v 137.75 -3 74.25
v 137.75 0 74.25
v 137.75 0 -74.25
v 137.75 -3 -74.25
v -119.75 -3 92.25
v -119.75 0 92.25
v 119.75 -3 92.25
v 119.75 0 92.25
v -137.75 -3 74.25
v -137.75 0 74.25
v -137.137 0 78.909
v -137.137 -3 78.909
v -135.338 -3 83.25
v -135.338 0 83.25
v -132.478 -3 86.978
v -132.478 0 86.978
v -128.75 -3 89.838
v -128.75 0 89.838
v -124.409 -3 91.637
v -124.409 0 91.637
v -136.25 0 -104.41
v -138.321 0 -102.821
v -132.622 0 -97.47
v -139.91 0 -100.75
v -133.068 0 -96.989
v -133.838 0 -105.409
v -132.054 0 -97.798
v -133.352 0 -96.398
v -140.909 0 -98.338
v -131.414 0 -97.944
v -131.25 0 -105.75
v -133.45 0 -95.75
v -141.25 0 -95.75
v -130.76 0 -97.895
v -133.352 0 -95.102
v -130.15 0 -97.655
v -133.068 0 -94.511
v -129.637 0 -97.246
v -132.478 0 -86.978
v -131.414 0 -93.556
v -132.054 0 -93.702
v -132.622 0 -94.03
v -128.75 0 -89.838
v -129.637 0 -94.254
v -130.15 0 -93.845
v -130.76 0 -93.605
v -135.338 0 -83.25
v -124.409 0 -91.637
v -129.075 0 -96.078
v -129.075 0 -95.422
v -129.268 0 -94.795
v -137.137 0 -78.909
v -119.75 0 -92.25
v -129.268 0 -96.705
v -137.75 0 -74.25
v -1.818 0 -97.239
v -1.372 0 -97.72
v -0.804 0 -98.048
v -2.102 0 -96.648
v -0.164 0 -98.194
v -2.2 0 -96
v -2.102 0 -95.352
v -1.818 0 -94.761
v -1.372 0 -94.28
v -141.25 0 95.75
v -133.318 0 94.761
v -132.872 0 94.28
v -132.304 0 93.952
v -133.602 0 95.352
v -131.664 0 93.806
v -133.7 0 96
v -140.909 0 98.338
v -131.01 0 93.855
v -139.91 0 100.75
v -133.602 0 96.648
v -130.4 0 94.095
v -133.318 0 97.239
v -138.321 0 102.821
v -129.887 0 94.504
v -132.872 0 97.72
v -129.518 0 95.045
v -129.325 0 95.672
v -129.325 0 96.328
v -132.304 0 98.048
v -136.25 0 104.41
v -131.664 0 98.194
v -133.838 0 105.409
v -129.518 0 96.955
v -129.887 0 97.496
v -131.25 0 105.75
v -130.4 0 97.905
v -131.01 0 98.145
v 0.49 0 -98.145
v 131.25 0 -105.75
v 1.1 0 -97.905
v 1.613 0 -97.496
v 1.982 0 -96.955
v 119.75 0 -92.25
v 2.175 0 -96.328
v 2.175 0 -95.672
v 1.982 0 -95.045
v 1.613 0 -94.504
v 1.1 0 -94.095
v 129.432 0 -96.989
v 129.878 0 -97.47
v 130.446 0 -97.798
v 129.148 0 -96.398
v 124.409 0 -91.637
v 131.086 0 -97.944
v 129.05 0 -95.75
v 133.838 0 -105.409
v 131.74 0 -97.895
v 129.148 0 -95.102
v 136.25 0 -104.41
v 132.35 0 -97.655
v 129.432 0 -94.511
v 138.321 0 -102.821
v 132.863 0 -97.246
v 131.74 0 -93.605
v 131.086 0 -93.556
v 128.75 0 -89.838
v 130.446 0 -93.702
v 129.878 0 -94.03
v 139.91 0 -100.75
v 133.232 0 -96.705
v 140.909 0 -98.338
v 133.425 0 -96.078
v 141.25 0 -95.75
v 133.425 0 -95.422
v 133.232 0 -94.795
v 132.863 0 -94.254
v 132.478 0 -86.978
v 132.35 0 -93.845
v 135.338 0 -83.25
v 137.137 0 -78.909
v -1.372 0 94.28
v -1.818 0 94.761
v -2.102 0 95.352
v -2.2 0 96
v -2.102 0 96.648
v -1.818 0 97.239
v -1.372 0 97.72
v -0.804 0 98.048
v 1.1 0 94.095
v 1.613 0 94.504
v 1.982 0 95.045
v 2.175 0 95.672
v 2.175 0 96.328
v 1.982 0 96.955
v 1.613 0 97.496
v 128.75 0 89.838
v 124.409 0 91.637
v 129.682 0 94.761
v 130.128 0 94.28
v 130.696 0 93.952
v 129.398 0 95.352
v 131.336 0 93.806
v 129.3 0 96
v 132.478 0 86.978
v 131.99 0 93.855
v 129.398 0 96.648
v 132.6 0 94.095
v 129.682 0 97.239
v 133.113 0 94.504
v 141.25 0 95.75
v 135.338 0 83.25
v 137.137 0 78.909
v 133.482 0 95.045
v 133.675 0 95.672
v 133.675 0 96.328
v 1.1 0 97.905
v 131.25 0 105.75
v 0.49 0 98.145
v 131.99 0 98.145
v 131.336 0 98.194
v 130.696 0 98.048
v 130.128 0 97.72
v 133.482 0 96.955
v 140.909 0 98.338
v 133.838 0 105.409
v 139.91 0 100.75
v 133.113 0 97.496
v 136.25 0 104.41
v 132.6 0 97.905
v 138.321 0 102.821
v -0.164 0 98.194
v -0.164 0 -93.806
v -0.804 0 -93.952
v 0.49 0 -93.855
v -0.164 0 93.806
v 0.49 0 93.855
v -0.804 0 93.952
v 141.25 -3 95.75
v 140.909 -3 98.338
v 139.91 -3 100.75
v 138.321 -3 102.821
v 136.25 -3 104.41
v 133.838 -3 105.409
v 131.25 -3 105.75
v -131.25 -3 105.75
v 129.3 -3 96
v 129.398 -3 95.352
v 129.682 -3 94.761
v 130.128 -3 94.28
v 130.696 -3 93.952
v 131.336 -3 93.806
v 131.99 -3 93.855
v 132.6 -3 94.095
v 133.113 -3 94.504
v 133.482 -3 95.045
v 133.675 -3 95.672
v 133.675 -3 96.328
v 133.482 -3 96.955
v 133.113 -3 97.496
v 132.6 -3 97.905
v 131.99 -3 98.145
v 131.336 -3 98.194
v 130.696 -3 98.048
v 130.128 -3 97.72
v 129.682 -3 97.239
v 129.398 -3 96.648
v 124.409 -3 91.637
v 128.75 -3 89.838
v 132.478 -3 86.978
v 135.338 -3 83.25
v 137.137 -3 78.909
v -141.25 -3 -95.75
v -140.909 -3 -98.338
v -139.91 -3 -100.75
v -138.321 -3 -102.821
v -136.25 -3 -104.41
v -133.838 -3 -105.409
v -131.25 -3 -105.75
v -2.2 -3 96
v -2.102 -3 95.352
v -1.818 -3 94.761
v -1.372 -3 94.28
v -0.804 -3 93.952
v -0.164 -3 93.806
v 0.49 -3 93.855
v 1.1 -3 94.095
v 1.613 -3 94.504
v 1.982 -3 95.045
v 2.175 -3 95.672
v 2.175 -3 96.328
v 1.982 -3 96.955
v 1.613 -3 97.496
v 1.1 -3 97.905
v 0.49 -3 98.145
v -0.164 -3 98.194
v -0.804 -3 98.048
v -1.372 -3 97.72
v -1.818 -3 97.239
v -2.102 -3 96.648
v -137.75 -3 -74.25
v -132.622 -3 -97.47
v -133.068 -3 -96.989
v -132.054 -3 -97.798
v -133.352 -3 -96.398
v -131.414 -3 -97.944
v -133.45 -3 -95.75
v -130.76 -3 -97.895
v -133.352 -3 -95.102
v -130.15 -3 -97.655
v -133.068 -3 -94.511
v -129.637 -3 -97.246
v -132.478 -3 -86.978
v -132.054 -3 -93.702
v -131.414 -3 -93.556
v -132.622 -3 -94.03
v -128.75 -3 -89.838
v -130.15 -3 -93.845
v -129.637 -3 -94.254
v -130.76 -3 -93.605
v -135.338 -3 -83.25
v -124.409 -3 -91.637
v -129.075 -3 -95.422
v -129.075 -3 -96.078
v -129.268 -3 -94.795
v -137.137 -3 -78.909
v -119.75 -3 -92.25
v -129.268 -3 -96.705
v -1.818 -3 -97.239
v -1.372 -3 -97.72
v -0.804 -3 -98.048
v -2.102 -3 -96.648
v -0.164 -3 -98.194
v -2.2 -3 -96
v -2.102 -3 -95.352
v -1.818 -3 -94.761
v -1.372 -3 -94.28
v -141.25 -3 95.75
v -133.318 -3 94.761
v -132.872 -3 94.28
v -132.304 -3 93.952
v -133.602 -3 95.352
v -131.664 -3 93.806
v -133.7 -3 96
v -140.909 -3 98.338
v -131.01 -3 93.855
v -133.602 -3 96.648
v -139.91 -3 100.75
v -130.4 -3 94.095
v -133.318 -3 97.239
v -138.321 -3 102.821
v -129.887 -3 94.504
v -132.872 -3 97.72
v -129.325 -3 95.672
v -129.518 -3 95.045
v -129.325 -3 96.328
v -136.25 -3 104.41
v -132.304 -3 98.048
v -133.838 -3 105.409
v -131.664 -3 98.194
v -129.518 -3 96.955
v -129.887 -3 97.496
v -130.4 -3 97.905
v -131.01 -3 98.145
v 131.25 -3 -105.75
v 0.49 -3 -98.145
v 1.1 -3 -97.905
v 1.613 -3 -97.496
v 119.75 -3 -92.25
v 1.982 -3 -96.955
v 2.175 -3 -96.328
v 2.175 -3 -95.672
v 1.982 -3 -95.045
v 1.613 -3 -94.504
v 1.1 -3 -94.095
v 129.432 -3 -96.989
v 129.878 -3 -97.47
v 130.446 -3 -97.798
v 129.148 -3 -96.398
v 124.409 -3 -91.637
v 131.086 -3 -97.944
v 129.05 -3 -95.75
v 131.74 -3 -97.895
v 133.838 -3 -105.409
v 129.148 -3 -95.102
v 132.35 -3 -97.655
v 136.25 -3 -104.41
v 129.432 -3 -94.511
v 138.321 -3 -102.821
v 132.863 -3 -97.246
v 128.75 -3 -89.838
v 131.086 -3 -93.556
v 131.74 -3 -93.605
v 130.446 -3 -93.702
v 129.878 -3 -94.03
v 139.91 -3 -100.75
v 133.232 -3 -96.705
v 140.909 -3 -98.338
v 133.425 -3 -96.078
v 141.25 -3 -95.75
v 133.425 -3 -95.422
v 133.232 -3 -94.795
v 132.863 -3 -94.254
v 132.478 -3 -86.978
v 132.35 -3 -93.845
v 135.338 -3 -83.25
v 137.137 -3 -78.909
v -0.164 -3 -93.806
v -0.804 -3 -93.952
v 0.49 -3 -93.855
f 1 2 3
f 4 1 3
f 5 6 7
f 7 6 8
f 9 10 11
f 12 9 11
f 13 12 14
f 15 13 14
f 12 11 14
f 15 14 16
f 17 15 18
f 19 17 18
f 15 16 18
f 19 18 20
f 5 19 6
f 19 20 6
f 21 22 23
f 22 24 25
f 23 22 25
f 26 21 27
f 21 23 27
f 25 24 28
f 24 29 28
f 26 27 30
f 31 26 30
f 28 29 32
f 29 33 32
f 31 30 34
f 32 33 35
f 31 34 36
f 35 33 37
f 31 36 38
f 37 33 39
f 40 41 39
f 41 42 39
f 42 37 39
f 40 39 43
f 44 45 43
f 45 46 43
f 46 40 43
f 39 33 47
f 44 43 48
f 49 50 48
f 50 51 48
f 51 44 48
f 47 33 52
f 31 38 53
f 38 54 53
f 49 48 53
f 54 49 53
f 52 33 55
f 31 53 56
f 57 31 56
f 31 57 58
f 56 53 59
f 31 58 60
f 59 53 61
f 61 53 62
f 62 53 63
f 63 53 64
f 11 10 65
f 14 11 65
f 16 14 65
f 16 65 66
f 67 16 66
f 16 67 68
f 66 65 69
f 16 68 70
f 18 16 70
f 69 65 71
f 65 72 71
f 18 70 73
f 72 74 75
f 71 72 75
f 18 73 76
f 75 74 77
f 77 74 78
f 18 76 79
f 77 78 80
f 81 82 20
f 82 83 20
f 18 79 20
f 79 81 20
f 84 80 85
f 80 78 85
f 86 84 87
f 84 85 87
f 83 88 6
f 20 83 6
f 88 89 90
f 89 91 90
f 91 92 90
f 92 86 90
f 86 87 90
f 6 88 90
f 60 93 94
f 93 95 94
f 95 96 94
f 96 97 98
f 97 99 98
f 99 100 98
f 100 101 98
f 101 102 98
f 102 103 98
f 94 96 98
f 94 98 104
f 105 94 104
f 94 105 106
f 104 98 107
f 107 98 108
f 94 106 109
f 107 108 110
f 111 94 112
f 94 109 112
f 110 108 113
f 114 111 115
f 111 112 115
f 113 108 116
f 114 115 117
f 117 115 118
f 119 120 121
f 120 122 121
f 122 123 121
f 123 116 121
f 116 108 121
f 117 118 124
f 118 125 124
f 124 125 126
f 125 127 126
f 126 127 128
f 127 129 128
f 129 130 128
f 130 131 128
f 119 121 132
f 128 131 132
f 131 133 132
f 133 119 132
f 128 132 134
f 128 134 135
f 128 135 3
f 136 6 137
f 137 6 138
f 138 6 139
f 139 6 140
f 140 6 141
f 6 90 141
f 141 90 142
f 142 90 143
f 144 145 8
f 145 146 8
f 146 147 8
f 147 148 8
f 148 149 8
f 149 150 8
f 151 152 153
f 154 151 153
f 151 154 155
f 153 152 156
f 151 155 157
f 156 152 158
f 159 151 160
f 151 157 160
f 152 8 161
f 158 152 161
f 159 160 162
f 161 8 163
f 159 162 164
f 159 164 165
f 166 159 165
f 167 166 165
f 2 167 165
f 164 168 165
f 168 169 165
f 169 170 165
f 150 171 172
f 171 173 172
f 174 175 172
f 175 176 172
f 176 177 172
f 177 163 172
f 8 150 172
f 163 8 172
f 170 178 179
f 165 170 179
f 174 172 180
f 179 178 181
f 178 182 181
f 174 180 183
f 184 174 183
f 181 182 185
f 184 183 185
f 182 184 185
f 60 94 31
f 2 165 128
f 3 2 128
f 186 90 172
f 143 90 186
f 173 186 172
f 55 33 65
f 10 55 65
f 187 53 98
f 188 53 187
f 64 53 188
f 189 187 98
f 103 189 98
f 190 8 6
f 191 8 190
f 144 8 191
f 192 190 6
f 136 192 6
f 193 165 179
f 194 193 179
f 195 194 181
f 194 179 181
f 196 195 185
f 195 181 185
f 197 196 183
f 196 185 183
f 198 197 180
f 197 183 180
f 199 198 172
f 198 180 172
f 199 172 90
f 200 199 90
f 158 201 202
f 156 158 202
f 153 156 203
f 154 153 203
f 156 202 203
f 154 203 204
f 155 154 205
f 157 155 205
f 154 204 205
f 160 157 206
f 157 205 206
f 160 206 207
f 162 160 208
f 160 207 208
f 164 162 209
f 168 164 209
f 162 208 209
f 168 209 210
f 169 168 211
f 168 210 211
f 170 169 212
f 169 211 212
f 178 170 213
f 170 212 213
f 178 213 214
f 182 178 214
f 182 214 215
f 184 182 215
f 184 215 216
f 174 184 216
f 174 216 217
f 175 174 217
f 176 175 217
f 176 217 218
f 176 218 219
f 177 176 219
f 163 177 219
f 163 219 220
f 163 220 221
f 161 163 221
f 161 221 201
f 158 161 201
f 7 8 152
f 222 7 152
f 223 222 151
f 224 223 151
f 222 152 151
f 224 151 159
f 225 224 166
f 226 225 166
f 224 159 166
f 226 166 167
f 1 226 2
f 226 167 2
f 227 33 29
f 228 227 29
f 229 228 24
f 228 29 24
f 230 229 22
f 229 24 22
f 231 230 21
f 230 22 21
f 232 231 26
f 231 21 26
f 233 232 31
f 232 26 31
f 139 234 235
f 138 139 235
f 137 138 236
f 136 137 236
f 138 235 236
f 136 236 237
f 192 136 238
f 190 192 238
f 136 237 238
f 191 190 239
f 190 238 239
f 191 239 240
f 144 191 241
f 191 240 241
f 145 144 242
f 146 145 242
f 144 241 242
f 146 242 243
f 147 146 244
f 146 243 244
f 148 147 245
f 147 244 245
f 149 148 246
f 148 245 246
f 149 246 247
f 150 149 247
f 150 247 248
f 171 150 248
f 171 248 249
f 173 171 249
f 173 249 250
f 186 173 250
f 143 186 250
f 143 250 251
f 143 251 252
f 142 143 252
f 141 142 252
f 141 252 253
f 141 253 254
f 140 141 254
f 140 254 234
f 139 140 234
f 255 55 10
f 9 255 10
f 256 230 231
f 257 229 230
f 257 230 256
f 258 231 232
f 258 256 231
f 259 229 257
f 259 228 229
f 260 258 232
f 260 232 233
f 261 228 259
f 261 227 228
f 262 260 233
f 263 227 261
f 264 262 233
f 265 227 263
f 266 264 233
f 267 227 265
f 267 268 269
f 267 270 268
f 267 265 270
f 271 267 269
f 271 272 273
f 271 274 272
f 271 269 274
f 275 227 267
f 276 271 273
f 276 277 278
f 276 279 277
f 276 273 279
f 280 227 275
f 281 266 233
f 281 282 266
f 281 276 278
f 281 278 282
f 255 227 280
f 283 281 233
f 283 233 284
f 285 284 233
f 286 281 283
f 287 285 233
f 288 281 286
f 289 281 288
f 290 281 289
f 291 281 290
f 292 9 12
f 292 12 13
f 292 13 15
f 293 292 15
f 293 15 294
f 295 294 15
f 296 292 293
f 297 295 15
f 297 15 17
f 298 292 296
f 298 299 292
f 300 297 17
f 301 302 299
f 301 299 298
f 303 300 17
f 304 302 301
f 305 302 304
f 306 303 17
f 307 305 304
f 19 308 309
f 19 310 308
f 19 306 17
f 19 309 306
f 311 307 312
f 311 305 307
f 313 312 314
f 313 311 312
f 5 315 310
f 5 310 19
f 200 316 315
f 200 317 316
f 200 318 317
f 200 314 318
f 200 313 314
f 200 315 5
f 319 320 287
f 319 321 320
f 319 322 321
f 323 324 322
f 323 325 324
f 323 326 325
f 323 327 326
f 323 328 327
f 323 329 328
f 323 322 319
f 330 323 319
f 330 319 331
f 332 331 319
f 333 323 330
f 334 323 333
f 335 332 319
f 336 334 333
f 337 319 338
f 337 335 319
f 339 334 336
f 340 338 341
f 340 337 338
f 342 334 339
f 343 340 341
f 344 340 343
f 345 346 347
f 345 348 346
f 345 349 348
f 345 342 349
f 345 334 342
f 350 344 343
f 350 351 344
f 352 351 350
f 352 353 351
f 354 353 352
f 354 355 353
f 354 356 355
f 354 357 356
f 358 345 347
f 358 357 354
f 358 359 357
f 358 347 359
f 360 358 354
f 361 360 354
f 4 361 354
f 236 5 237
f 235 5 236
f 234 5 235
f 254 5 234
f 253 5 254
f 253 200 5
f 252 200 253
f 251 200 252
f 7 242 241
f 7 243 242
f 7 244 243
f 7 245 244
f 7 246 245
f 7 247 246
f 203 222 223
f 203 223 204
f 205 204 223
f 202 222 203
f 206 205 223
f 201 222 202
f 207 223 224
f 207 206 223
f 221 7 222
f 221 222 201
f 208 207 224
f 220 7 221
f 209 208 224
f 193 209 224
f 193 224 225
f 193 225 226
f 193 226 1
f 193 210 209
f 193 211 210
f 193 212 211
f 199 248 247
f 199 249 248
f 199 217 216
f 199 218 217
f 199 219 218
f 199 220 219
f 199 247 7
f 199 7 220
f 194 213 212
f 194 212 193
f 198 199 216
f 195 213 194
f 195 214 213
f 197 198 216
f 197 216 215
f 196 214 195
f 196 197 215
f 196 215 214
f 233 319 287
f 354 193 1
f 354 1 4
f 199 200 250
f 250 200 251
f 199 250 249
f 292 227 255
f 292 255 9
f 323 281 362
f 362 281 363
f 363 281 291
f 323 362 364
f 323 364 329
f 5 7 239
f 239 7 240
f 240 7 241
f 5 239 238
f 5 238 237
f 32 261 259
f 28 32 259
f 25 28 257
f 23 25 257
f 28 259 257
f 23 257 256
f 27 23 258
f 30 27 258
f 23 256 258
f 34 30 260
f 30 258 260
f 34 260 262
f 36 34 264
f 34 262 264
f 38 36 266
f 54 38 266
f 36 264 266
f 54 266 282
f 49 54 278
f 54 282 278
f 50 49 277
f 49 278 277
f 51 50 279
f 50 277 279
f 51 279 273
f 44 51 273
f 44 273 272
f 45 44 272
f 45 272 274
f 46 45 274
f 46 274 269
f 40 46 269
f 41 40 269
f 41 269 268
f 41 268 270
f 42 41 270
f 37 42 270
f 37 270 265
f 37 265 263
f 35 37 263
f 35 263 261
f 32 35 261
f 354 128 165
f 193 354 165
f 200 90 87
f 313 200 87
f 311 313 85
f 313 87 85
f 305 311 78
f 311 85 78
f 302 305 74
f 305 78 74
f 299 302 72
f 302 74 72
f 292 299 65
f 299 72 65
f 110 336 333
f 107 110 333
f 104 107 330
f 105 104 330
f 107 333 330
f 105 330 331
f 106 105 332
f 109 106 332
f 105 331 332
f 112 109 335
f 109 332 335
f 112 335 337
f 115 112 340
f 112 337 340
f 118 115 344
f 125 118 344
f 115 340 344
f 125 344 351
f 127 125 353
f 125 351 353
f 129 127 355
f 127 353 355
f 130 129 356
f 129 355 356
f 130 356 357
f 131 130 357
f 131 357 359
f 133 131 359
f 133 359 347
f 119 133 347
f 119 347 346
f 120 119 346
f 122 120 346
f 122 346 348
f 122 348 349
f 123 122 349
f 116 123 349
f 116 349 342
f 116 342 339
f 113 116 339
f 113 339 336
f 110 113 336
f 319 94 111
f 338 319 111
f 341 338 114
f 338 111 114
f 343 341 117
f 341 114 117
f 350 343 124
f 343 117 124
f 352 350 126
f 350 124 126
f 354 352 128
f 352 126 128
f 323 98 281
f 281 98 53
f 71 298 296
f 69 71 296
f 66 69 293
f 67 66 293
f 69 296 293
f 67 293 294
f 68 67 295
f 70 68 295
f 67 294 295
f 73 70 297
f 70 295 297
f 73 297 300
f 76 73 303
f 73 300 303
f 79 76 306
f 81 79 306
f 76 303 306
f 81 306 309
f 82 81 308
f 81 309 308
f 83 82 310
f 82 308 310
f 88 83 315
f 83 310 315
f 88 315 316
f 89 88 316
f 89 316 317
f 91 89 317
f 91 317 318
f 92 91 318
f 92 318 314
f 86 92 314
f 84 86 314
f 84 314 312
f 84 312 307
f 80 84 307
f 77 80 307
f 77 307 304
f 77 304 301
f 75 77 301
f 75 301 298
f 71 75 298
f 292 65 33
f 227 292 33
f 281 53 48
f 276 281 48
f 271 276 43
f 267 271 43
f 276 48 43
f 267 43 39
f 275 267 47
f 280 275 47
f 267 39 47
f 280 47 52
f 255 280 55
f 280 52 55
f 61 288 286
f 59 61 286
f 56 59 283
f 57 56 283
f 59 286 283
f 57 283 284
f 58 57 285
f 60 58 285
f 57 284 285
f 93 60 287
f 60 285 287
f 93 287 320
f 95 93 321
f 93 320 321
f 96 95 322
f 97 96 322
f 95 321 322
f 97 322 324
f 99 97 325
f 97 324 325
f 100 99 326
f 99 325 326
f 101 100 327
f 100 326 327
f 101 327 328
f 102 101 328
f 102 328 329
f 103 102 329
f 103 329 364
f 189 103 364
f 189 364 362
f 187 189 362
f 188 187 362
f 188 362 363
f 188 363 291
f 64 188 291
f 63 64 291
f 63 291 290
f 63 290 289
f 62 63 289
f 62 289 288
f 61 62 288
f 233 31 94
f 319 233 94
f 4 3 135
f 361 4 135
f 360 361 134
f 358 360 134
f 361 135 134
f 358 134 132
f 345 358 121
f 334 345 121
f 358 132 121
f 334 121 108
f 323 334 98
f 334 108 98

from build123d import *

# Parameters (mm, degrees)
F1_DEPTH = 3
F2_D     = 4.4


with BuildPart() as f1:
    # F0 (on Front) → F1 (new body)
    with BuildSketch(Plane.XZ):
        with BuildLine():
            Line((-131.25, -105.75), (131.25, -105.75))
            ThreePointArc((131.25, -105.75), (138.3210678119, -102.8210678119), (141.25, -95.75))
            Line((141.25, -95.75), (141.25, 95.75))
            ThreePointArc((141.25, 95.75), (138.3210678119, 102.8210678119), (131.25, 105.75))
            Line((131.25, 105.75), (-131.25, 105.75))
            ThreePointArc((-131.25, 105.75), (-138.3210678119, 102.8210678119), (-141.25, 95.75))
            Line((-141.25, 95.75), (-141.25, -95.75))
            ThreePointArc((-141.25, -95.75), (-138.3210678119, -102.8210678119), (-131.25, -105.75))
        make_face()
        with BuildLine():
            ThreePointArc((137.75, -74.25), (132.4779220614, -86.9779220614), (119.75, -92.25))
            Line((119.75, -92.25), (-119.75, -92.25))
            ThreePointArc((-119.75, -92.25), (-132.4779220614, -86.9779220614), (-137.75, -74.25))
            Line((-137.75, -74.25), (-137.75, 74.25))
            ThreePointArc((-137.75, 74.25), (-132.4779220614, 86.9779220614), (-119.75, 92.25))
            Line((-119.75, 92.25), (119.75, 92.25))
            ThreePointArc((119.75, 92.25), (132.4779220614, 86.9779220614), (137.75, 74.25))
            Line((137.75, 74.25), (137.75, -74.25))
        make_face(mode=Mode.SUBTRACT)
    extrude(amount=F1_DEPTH)

    # F2 (through all)
    with Locations(Plane(origin=(0, 0, 0), x_dir=(1, 0, 0), z_dir=(0, 1, 0))):
        with Locations((-131.5, -96), (0, -96), (131.5, -96), (131.25, 95.75), (0, 96), (-131.25, 95.75)):
            Hole(F2_D / 2)


solid = f1.part
